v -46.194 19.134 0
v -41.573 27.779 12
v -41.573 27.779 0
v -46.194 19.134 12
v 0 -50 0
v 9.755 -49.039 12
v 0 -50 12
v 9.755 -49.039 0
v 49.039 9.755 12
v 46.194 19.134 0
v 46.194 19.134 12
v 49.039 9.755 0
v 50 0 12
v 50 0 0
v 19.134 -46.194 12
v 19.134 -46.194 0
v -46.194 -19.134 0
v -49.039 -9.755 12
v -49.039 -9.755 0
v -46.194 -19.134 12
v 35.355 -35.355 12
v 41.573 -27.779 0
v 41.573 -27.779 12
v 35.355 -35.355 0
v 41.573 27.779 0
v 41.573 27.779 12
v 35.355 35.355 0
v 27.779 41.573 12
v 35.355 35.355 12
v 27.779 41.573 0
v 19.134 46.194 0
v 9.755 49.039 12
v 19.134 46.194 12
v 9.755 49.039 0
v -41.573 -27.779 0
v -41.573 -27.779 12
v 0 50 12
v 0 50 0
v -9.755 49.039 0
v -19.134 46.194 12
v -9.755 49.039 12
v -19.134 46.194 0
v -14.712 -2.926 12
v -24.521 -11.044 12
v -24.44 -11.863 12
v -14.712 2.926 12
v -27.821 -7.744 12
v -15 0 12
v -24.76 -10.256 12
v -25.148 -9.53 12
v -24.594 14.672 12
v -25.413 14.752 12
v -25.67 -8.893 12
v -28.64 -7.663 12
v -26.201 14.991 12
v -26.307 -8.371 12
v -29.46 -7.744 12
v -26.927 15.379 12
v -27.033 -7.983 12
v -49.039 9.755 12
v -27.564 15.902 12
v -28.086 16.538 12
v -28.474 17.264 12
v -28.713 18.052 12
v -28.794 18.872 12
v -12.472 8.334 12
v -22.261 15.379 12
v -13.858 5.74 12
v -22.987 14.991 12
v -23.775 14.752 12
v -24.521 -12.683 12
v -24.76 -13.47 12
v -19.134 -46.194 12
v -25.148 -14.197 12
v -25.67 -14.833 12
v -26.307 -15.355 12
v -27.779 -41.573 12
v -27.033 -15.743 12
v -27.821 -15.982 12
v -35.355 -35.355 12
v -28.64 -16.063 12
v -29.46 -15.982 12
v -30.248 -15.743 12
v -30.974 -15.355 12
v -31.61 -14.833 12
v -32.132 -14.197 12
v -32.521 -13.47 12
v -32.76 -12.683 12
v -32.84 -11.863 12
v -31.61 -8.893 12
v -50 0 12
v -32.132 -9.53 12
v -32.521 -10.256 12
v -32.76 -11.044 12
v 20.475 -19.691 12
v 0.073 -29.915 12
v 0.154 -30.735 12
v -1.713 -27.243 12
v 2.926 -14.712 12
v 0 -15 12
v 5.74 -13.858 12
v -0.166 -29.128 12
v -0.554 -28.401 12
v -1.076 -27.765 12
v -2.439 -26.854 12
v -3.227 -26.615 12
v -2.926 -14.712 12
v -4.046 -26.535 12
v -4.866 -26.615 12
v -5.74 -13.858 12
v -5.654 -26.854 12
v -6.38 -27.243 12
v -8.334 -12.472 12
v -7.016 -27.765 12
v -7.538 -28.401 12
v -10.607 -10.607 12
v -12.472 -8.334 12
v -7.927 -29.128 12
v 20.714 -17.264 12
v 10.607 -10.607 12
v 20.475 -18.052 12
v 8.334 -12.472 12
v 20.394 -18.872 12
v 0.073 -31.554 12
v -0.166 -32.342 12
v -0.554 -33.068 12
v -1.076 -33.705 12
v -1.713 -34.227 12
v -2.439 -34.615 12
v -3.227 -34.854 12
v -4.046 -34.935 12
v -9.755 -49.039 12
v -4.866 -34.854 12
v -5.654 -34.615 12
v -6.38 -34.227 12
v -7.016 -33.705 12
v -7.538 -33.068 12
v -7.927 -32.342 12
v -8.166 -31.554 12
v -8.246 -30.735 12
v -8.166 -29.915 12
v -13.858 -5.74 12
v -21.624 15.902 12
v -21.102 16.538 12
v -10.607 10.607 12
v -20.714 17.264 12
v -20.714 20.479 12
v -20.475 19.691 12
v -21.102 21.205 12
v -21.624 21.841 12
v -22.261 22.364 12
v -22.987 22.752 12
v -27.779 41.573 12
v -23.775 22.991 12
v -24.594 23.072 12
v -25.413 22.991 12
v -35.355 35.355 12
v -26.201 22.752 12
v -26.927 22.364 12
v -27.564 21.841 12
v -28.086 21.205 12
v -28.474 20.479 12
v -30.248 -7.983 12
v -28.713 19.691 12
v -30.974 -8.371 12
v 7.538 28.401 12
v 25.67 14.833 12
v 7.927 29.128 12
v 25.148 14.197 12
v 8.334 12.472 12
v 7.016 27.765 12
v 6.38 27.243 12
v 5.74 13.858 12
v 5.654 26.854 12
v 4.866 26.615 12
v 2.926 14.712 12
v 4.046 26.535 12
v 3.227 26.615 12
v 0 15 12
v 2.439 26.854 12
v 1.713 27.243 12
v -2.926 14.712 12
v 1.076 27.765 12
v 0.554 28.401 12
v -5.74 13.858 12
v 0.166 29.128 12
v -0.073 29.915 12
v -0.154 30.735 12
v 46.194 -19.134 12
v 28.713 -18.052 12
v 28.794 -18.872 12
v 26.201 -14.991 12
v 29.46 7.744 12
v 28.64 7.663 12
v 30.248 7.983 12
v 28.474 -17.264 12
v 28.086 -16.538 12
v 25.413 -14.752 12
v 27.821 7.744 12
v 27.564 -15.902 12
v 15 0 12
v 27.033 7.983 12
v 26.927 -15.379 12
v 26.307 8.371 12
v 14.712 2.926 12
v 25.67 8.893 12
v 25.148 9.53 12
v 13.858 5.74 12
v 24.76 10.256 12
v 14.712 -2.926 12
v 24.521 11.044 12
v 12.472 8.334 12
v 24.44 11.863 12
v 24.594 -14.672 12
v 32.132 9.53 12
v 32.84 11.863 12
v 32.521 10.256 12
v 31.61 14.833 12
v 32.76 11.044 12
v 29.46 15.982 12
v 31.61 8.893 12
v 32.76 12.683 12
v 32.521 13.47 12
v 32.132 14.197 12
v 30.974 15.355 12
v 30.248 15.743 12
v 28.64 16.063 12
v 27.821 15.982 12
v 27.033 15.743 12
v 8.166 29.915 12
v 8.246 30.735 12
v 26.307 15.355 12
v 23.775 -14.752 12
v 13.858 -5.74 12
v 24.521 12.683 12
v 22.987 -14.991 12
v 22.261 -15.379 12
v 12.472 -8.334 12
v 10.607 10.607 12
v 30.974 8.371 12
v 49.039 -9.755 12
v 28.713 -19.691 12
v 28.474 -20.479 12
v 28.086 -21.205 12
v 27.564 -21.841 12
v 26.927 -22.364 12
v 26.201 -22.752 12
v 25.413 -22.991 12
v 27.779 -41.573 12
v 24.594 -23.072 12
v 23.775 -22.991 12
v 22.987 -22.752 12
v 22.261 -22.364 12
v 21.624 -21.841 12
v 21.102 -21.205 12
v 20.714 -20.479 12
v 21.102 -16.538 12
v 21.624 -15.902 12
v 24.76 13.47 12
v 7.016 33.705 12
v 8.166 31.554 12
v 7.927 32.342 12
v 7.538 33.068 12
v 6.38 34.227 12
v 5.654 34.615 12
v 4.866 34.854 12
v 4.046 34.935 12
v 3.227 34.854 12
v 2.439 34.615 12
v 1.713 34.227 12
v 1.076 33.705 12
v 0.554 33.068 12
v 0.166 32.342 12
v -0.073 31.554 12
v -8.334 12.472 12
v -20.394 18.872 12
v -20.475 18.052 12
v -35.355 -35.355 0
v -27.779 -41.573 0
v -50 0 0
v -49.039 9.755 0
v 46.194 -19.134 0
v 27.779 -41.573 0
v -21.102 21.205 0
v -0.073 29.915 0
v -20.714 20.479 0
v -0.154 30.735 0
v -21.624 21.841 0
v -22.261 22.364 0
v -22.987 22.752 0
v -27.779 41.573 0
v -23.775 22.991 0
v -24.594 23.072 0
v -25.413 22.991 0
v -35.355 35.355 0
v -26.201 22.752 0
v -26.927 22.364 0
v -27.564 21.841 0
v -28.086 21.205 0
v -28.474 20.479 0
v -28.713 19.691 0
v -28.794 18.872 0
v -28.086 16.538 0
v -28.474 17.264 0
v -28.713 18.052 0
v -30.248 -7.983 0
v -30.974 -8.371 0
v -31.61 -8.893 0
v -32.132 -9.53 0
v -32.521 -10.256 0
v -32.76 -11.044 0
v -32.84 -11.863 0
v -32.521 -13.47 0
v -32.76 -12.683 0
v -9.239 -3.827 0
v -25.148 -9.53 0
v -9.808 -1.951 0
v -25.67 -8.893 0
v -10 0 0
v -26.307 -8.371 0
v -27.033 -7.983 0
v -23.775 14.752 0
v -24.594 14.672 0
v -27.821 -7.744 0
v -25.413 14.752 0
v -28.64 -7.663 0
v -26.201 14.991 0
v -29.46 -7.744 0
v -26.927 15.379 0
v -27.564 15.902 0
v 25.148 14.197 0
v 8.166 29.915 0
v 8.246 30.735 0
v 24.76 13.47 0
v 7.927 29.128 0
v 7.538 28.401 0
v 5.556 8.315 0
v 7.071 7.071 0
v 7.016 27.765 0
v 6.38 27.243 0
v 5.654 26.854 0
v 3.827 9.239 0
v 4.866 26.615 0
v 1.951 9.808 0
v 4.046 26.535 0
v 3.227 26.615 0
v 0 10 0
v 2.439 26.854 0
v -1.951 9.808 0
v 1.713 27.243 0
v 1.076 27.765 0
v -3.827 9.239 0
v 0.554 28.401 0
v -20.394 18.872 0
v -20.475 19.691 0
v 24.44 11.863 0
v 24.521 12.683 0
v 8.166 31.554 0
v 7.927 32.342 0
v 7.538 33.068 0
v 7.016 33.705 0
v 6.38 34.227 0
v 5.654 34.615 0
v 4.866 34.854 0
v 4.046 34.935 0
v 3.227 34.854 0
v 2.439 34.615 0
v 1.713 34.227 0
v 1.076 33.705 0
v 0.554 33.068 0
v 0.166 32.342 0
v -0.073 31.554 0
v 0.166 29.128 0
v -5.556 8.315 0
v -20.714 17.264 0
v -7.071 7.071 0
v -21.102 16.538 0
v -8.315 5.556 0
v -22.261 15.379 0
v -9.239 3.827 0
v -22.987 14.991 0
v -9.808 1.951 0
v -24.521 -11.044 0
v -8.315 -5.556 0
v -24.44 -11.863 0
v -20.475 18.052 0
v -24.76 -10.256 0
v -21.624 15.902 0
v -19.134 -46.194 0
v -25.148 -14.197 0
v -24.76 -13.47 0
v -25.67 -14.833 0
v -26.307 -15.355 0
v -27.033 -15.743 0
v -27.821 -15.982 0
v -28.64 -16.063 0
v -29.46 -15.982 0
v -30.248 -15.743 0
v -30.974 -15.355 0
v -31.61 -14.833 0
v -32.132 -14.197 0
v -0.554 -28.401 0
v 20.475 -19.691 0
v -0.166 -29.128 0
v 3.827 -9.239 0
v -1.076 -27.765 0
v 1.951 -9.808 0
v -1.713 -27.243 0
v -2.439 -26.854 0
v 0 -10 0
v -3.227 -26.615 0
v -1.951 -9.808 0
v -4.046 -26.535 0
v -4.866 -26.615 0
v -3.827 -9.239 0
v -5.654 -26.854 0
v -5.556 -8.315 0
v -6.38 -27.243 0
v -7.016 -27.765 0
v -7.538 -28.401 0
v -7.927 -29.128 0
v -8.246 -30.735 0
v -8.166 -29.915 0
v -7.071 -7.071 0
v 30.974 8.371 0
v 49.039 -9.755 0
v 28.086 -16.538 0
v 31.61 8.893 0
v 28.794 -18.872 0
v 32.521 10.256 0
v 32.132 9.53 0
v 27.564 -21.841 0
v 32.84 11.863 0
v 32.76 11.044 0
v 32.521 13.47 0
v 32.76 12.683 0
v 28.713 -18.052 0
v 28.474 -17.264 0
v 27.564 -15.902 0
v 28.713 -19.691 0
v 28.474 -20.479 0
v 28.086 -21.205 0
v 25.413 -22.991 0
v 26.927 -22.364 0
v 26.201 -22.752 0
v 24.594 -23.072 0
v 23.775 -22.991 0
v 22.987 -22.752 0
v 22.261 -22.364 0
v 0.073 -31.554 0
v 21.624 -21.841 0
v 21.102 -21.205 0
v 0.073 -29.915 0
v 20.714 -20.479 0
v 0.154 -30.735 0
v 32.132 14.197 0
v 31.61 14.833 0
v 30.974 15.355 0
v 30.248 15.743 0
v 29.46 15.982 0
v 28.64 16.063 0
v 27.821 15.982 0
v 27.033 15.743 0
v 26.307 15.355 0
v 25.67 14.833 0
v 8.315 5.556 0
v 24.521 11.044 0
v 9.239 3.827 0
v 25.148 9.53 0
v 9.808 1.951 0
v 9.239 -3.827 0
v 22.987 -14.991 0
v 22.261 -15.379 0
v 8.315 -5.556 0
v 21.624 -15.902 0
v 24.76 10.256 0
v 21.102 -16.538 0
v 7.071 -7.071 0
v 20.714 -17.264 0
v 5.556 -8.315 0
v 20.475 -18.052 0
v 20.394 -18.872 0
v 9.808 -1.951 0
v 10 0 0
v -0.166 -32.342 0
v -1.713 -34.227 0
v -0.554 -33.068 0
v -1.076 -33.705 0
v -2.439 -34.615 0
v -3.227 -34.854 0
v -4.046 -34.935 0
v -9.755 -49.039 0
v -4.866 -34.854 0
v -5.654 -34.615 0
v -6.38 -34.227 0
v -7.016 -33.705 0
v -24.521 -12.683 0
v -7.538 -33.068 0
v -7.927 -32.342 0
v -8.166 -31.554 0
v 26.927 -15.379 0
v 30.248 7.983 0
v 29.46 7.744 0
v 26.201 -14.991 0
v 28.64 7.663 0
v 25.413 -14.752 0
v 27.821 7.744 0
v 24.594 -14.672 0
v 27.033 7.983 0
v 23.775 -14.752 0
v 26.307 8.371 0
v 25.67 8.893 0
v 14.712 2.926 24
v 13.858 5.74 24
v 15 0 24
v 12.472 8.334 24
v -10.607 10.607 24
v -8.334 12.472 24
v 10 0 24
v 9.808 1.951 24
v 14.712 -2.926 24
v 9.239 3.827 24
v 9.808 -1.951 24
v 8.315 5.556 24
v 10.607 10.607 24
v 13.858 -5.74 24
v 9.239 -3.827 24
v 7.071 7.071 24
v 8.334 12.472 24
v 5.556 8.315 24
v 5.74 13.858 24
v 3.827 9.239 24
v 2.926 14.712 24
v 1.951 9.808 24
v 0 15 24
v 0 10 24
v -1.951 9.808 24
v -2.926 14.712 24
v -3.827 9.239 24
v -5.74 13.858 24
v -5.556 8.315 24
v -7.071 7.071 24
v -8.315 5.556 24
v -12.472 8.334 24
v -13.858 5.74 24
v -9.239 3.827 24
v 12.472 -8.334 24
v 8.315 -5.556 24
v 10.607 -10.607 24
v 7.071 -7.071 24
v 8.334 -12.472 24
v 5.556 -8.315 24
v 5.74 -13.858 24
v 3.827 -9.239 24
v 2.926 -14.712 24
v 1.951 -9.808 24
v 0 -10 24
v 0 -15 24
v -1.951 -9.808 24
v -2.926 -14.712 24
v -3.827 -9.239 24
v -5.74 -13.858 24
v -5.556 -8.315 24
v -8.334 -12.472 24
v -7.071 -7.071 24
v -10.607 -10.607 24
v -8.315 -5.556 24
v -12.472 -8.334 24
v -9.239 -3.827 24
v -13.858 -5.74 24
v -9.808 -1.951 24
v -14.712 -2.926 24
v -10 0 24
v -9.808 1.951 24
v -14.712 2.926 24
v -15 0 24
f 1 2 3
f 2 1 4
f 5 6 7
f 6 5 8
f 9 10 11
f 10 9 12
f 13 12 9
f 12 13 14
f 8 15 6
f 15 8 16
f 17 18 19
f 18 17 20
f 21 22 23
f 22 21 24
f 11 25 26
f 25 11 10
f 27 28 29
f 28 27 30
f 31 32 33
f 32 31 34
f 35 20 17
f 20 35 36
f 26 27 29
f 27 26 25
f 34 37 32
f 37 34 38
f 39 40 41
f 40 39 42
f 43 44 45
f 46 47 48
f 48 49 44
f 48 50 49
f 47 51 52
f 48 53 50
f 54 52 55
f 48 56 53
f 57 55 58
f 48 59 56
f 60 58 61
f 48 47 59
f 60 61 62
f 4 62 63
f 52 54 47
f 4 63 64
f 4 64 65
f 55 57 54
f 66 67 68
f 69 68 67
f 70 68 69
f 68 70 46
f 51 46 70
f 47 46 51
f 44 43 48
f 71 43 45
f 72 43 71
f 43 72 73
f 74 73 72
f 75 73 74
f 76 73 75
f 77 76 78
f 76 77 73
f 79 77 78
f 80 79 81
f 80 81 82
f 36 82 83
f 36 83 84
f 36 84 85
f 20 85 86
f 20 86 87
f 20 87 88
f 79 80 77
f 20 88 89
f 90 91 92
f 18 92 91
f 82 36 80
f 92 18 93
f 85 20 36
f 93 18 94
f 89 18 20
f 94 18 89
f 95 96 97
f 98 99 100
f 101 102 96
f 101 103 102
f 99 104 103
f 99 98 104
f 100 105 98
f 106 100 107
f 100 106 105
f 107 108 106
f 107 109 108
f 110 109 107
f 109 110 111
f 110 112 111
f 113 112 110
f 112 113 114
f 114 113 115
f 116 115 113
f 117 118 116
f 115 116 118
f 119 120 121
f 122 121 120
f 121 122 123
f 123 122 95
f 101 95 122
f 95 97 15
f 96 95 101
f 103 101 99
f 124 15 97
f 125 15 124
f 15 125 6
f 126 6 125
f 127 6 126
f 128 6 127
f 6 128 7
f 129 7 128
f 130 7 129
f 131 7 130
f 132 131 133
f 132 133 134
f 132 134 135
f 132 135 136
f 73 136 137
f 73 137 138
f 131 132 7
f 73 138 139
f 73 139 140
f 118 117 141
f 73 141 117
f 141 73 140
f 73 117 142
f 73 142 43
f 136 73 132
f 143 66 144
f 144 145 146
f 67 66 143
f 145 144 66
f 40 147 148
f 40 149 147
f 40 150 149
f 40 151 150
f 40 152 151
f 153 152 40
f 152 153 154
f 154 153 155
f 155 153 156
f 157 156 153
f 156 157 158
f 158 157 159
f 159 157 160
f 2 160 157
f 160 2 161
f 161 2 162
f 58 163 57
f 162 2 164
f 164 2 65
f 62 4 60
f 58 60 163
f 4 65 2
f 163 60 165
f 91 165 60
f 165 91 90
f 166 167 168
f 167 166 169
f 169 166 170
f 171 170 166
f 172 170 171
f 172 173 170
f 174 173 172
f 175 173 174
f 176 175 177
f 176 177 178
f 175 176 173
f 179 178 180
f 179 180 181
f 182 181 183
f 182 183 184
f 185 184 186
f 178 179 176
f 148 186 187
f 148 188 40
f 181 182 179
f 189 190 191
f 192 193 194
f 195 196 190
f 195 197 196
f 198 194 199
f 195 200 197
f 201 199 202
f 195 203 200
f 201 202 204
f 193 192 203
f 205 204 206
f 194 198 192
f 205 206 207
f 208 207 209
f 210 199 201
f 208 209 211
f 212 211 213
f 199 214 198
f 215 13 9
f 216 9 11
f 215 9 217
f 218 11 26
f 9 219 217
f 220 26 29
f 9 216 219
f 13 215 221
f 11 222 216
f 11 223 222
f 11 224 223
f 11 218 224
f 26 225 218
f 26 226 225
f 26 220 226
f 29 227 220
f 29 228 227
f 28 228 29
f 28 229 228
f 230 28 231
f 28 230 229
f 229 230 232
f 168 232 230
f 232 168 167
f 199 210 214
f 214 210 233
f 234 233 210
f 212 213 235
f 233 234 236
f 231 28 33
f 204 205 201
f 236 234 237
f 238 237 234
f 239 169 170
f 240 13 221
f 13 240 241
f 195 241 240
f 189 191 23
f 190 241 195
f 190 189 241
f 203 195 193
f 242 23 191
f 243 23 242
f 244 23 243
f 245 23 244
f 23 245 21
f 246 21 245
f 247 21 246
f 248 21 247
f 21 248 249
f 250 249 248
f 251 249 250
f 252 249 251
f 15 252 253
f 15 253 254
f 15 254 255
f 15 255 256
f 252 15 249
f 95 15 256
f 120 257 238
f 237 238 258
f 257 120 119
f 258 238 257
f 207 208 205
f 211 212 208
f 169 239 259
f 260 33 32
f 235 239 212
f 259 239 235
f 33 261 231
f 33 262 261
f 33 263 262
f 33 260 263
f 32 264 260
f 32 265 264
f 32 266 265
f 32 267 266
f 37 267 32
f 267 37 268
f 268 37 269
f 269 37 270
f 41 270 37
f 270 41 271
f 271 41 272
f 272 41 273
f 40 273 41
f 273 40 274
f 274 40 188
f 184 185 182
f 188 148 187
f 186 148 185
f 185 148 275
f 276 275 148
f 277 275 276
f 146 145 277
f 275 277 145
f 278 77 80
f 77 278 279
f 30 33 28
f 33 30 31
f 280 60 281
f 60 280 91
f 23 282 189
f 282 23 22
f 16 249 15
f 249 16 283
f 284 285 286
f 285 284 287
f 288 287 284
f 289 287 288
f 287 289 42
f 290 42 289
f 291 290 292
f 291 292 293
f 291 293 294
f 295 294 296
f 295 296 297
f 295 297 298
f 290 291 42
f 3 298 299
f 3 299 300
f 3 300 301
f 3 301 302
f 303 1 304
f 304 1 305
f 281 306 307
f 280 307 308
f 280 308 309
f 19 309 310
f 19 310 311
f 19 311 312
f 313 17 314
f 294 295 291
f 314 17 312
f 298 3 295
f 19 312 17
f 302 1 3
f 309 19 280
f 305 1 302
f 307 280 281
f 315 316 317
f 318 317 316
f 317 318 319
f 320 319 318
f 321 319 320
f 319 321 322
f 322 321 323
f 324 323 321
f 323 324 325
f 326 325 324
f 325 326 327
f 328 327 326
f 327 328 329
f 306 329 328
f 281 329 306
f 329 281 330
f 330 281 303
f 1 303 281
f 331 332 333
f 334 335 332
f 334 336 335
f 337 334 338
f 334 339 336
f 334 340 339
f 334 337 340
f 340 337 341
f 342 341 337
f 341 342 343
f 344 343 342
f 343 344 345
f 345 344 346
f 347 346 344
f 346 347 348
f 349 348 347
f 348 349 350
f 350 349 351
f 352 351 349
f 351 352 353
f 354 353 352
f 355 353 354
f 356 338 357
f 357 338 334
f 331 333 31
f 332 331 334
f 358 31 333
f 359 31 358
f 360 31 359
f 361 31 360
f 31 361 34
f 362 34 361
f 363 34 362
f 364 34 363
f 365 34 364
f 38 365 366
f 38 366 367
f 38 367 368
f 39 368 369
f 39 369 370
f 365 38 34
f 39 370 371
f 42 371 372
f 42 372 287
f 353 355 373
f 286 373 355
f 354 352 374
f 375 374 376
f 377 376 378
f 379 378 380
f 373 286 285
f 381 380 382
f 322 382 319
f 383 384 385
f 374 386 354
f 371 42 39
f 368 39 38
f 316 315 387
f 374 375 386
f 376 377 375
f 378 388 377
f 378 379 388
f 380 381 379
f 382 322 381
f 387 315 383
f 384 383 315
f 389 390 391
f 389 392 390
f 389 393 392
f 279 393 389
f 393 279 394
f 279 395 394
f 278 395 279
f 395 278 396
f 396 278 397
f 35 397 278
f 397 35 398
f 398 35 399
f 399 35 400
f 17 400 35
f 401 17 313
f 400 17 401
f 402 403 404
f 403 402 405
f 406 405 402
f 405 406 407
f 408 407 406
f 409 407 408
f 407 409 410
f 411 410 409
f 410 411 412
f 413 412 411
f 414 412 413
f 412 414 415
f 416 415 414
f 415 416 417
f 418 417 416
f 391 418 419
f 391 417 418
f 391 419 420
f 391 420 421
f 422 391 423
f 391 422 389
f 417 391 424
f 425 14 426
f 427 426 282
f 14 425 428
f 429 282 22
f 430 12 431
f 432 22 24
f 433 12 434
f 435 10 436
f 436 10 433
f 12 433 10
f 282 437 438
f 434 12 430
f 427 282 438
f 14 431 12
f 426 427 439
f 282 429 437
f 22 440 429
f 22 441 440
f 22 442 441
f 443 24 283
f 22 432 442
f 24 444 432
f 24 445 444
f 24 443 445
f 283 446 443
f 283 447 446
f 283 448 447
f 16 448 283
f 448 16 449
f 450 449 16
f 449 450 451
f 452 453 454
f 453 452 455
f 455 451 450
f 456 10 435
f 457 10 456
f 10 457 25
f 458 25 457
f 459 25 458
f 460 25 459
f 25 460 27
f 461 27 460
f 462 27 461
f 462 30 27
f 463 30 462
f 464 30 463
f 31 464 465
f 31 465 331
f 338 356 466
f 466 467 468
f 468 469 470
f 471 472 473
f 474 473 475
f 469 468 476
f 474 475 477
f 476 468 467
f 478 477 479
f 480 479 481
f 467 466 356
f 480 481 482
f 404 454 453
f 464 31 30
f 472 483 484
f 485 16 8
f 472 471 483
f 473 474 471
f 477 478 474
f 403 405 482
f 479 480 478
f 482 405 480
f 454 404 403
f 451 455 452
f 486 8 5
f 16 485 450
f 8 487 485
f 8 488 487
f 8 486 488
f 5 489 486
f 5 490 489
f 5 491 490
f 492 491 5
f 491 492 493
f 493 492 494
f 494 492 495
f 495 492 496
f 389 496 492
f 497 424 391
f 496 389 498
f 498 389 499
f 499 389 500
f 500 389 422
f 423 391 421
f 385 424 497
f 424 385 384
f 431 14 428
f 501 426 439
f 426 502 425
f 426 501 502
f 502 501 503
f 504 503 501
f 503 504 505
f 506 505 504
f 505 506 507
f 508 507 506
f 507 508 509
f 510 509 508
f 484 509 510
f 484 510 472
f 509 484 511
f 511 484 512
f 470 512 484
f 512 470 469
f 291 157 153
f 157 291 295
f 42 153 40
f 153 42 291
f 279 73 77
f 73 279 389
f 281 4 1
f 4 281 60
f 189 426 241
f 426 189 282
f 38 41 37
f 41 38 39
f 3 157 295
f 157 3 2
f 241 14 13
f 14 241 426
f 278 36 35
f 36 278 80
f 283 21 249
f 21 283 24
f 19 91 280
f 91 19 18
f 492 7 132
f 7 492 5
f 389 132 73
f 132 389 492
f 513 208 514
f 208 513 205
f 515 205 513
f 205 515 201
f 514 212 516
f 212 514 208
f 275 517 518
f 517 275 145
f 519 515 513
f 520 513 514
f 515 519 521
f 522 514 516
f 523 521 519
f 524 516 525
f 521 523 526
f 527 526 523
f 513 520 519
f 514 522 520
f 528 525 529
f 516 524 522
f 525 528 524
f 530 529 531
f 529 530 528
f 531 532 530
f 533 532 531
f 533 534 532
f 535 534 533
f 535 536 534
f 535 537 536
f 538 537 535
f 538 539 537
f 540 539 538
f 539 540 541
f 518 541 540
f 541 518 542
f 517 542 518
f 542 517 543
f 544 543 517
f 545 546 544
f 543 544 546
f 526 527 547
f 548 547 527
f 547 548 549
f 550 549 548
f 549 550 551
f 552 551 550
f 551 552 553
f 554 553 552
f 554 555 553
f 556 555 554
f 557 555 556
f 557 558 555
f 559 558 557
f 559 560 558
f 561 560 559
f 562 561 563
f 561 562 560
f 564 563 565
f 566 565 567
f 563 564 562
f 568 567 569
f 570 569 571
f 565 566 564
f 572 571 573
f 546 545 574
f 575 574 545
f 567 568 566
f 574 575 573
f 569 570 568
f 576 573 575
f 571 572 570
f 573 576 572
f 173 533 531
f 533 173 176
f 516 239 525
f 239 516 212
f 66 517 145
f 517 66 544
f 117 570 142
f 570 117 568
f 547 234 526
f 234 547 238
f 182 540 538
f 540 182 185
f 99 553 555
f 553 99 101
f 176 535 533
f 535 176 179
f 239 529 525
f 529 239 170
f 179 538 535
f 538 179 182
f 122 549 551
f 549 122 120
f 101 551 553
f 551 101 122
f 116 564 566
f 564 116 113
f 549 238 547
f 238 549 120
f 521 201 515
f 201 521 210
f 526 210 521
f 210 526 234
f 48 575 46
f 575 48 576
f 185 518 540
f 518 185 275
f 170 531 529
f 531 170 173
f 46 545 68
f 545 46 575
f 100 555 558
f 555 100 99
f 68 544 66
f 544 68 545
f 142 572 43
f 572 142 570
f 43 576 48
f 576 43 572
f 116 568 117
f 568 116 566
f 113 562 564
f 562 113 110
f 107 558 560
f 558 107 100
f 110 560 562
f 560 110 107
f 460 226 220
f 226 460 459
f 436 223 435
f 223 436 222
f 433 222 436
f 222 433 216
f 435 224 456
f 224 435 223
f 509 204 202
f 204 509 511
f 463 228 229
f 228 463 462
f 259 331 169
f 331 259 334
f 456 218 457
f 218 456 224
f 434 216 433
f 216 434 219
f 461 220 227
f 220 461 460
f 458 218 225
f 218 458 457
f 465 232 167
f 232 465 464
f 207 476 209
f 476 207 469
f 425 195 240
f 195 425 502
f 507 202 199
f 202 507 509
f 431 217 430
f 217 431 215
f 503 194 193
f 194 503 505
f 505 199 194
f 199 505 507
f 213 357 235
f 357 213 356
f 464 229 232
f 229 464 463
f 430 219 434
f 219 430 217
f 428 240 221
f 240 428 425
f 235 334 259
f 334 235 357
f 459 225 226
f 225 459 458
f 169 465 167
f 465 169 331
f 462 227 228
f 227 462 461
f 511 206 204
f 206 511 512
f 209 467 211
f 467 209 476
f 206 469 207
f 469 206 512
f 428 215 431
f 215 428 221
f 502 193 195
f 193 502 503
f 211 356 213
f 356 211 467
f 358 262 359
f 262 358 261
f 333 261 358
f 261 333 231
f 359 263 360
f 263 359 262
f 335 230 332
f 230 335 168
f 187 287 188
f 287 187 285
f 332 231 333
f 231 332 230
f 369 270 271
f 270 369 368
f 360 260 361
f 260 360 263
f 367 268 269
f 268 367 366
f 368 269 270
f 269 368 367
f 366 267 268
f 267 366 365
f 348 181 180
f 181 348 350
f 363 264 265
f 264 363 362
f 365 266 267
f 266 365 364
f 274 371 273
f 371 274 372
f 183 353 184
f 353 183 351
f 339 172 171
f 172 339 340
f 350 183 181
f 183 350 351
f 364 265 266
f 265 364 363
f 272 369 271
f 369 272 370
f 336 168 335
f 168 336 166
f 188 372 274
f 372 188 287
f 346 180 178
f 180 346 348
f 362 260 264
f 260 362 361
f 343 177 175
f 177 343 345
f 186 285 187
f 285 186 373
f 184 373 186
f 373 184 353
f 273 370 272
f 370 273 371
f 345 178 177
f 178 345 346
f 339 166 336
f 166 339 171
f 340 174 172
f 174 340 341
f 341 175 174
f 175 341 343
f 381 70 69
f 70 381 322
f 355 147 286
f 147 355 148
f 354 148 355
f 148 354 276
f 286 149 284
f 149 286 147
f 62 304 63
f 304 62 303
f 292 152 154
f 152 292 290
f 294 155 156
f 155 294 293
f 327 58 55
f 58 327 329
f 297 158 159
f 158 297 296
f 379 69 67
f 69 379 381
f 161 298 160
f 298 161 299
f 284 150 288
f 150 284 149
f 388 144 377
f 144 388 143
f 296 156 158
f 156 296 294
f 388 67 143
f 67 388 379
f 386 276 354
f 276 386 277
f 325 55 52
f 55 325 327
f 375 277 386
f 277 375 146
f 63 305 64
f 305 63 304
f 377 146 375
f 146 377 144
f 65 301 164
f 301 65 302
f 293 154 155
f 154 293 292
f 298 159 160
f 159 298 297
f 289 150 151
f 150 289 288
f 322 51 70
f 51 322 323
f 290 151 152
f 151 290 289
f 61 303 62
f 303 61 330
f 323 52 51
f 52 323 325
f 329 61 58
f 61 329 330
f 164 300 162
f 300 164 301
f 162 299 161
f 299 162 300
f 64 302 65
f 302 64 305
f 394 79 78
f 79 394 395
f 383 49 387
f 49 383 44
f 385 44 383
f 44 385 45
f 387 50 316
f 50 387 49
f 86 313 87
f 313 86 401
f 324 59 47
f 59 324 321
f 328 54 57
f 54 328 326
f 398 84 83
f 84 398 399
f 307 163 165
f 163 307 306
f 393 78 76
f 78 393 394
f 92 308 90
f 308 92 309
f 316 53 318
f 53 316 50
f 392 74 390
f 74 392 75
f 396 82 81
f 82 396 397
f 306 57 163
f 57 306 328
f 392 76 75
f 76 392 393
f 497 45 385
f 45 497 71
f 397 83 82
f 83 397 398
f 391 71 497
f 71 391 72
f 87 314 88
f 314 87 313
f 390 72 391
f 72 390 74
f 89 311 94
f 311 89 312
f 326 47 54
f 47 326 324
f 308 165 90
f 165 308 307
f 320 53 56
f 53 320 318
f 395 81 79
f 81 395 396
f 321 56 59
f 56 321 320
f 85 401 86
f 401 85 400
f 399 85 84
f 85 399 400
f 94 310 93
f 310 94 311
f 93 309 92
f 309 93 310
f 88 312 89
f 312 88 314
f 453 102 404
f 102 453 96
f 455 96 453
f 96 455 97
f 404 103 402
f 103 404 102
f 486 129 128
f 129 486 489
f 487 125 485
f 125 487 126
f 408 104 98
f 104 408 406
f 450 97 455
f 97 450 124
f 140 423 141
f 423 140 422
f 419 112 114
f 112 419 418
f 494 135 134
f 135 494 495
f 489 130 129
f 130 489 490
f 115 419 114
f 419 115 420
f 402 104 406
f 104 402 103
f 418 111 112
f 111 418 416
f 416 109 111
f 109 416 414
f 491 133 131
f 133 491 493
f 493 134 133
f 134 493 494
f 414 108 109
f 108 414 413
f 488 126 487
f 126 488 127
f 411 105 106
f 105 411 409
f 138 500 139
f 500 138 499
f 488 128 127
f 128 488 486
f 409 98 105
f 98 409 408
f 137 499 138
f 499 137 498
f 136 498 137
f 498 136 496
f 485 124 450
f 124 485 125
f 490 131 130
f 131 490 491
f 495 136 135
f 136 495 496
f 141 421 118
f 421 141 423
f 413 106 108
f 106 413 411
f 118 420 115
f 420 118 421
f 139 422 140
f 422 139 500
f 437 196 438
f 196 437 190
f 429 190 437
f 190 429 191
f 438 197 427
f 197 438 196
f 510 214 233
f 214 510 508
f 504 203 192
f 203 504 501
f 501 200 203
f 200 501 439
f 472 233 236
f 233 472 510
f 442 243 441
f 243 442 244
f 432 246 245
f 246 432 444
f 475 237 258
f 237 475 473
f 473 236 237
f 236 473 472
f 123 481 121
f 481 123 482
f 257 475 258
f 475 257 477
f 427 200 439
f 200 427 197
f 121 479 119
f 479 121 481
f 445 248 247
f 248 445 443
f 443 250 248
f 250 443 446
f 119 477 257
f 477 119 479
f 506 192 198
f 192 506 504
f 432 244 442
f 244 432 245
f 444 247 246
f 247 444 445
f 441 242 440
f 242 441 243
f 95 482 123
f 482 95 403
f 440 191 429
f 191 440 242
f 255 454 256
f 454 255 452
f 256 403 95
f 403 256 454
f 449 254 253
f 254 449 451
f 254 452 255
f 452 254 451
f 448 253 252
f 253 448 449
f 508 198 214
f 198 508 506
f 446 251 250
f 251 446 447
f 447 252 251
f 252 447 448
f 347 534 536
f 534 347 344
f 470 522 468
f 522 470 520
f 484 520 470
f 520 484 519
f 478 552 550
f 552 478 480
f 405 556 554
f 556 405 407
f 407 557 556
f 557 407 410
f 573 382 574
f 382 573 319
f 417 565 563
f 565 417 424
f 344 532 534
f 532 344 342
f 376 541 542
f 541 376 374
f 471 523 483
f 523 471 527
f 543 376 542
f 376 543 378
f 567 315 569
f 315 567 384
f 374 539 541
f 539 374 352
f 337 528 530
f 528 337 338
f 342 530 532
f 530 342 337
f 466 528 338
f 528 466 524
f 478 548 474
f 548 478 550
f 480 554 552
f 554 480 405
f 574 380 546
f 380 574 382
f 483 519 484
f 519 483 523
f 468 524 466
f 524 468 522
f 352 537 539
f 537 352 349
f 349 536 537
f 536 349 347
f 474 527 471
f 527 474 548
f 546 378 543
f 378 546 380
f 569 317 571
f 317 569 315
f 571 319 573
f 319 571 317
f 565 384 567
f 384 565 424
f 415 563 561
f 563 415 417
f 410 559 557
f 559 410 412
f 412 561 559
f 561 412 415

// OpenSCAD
$fn = 32;

// ----------------------------------------------------------------------
// Flange Ø100 x 12
// 6 holes on a Ø62 bolt circle, bolted joints
// ----------------------------------------------------------------------

// --- parameters (mm) ---
flange_d = 100;    // outside diameter of the flange
thickness = 12;    // flange thickness
holes = 6;         // number of bolt holes
pcd = 62;          // bolt circle diameter
start_deg = 22.5;  // angle of the first hole, from +X
hole_d = 8.4;      // bolt hole diameter
bore_d = 20;       // central through bore
hub_d = 30;        // hub outside diameter
hub_h = 12;        // hub height above the flange face (0 = no hub)

// --- derived feature positions (mm) ---
height = thickness + hub_h;  // = 24   overall height of the part
pcd_r = pcd / 2;             // = 31   bolt circle radius
hole_step = 360 / holes;     // = 60   angular pitch
feature_centers = [
  [pcd_r * cos(start_deg + 0 * hole_step), pcd_r * sin(start_deg + 0 * hole_step)],
  [pcd_r * cos(start_deg + 1 * hole_step), pcd_r * sin(start_deg + 1 * hole_step)],
  [pcd_r * cos(start_deg + 2 * hole_step), pcd_r * sin(start_deg + 2 * hole_step)],
  [pcd_r * cos(start_deg + 3 * hole_step), pcd_r * sin(start_deg + 3 * hole_step)],
  [pcd_r * cos(start_deg + 4 * hole_step), pcd_r * sin(start_deg + 4 * hole_step)],
  [pcd_r * cos(start_deg + 5 * hole_step), pcd_r * sin(start_deg + 5 * hole_step)]
];   // bolt hole centres on the pitch circle

// flange disc, every hole and the bore cut straight through
difference() {
  union() {
    cylinder(d = flange_d, h = thickness);
    cylinder(d = hub_d, h = height);  // hub, overlapped into the flange
  }
  translate([0, 0, -1]) cylinder(d = bore_d, h = height + 2);  // bore, through
  for (centre = feature_centers)
    translate([centre[0], centre[1], -1]) cylinder(d = hole_d, h = thickness + 2);
}
